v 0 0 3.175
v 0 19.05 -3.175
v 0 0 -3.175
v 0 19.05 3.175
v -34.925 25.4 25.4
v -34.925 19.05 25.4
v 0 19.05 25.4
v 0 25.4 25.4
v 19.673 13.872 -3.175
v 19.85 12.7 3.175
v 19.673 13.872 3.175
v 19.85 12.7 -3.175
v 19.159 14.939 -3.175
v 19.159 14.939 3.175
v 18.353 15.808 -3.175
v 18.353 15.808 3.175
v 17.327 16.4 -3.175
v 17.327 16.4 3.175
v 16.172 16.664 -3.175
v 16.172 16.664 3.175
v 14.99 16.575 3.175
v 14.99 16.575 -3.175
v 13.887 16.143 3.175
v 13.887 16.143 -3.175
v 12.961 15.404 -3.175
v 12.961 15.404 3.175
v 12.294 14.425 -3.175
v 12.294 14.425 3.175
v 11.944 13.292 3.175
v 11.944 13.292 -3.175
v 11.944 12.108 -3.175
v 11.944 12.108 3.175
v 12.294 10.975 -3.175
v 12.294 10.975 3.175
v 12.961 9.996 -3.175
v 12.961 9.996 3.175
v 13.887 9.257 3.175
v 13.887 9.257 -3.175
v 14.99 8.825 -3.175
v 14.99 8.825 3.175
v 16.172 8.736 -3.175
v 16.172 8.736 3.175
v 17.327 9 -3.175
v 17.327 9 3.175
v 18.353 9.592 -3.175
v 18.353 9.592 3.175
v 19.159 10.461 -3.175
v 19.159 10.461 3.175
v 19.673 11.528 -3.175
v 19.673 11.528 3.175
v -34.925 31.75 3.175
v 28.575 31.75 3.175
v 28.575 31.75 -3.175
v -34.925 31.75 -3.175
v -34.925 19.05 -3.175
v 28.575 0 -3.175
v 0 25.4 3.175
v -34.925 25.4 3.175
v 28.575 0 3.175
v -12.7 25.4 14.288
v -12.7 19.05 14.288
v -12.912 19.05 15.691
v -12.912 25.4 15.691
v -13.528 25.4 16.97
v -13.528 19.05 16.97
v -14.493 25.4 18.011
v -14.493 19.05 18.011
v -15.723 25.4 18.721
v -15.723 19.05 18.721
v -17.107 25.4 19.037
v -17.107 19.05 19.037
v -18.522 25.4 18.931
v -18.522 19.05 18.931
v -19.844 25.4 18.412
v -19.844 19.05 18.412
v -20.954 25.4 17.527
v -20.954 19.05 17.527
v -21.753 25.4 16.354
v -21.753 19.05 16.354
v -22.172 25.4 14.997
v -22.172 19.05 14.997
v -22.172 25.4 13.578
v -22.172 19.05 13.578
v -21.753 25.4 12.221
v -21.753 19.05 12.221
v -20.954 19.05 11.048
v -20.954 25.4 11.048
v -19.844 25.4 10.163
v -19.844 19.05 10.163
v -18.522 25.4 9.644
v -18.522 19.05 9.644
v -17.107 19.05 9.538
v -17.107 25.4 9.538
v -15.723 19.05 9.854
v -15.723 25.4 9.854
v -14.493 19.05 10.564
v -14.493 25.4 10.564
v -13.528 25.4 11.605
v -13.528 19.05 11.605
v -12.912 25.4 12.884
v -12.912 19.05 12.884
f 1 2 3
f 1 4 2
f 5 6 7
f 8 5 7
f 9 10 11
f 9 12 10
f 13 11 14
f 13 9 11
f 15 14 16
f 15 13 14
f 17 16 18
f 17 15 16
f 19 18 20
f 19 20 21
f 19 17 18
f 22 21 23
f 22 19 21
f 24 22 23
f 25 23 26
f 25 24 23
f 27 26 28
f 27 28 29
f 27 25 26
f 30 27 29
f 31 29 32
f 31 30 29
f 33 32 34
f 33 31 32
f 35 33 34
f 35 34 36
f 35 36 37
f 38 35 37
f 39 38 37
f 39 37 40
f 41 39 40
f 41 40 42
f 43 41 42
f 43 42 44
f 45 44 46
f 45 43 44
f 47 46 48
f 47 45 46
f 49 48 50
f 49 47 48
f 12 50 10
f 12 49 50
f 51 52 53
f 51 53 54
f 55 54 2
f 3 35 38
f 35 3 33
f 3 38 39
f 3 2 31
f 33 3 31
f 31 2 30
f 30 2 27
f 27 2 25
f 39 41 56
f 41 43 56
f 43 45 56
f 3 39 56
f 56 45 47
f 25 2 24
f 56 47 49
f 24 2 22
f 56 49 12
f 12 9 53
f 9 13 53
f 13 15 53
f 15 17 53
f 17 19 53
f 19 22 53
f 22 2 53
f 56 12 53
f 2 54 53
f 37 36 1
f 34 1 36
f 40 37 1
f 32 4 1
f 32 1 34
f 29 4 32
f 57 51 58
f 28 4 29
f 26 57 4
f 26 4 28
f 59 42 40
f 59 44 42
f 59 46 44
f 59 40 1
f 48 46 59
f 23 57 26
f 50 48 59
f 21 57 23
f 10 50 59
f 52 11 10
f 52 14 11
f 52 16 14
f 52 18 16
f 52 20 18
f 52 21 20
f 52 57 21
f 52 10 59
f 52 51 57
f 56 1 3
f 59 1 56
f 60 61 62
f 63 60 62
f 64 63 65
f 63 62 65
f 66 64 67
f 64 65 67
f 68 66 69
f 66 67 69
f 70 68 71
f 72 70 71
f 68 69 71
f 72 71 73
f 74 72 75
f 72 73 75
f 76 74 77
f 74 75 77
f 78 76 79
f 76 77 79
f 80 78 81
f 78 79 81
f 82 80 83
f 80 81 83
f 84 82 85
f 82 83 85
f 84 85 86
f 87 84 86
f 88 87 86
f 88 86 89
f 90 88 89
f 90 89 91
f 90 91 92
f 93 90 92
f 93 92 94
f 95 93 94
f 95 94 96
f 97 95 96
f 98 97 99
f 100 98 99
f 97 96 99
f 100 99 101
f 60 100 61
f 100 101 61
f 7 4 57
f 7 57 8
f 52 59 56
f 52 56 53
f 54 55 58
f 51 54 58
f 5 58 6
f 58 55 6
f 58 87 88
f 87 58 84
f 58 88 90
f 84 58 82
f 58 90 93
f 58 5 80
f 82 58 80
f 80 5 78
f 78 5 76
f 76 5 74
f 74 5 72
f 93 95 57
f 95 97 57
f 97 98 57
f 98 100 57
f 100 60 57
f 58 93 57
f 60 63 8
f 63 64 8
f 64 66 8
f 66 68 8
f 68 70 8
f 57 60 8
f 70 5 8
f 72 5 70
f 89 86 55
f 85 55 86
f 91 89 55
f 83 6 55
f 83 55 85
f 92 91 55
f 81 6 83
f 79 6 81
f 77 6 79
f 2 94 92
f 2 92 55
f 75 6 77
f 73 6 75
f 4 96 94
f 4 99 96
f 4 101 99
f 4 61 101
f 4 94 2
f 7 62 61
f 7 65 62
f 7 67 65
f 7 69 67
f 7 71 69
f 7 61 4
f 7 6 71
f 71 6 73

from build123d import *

# Parameters (mm, degrees)
F0_R     = 3.9751
F1_DEPTH = 3.175
F2_W     = 34.925
F2_H     = 22.225
F2_R     = 4.7625
F3_DEPTH = 6.35


with BuildPart() as f1:
    # F0 (on Top) → F1 (new body, symmetric)
    with BuildSketch(Plane.XY):
        Polygon((0, 19.05), (0, 0), (28.575, 0), (28.575, 31.75), (-34.925, 31.75), (-34.925, 19.05), align=None)
        with Locations((15.875, 12.7)):
            Circle(F0_R, mode=Mode.SUBTRACT)
    extrude(amount=F1_DEPTH, both=True)

    # F2 (on face) → F3 (join)
    with BuildSketch(Plane.XZ.offset(-19.05)):
        with Locations((-17.4625, 14.2875)):
            Rectangle(F2_W, F2_H)
        with Locations((-17.4625, 14.2875)):
            Circle(F2_R, mode=Mode.SUBTRACT)
    extrude(amount=-F3_DEPTH)


solid = f1.part
